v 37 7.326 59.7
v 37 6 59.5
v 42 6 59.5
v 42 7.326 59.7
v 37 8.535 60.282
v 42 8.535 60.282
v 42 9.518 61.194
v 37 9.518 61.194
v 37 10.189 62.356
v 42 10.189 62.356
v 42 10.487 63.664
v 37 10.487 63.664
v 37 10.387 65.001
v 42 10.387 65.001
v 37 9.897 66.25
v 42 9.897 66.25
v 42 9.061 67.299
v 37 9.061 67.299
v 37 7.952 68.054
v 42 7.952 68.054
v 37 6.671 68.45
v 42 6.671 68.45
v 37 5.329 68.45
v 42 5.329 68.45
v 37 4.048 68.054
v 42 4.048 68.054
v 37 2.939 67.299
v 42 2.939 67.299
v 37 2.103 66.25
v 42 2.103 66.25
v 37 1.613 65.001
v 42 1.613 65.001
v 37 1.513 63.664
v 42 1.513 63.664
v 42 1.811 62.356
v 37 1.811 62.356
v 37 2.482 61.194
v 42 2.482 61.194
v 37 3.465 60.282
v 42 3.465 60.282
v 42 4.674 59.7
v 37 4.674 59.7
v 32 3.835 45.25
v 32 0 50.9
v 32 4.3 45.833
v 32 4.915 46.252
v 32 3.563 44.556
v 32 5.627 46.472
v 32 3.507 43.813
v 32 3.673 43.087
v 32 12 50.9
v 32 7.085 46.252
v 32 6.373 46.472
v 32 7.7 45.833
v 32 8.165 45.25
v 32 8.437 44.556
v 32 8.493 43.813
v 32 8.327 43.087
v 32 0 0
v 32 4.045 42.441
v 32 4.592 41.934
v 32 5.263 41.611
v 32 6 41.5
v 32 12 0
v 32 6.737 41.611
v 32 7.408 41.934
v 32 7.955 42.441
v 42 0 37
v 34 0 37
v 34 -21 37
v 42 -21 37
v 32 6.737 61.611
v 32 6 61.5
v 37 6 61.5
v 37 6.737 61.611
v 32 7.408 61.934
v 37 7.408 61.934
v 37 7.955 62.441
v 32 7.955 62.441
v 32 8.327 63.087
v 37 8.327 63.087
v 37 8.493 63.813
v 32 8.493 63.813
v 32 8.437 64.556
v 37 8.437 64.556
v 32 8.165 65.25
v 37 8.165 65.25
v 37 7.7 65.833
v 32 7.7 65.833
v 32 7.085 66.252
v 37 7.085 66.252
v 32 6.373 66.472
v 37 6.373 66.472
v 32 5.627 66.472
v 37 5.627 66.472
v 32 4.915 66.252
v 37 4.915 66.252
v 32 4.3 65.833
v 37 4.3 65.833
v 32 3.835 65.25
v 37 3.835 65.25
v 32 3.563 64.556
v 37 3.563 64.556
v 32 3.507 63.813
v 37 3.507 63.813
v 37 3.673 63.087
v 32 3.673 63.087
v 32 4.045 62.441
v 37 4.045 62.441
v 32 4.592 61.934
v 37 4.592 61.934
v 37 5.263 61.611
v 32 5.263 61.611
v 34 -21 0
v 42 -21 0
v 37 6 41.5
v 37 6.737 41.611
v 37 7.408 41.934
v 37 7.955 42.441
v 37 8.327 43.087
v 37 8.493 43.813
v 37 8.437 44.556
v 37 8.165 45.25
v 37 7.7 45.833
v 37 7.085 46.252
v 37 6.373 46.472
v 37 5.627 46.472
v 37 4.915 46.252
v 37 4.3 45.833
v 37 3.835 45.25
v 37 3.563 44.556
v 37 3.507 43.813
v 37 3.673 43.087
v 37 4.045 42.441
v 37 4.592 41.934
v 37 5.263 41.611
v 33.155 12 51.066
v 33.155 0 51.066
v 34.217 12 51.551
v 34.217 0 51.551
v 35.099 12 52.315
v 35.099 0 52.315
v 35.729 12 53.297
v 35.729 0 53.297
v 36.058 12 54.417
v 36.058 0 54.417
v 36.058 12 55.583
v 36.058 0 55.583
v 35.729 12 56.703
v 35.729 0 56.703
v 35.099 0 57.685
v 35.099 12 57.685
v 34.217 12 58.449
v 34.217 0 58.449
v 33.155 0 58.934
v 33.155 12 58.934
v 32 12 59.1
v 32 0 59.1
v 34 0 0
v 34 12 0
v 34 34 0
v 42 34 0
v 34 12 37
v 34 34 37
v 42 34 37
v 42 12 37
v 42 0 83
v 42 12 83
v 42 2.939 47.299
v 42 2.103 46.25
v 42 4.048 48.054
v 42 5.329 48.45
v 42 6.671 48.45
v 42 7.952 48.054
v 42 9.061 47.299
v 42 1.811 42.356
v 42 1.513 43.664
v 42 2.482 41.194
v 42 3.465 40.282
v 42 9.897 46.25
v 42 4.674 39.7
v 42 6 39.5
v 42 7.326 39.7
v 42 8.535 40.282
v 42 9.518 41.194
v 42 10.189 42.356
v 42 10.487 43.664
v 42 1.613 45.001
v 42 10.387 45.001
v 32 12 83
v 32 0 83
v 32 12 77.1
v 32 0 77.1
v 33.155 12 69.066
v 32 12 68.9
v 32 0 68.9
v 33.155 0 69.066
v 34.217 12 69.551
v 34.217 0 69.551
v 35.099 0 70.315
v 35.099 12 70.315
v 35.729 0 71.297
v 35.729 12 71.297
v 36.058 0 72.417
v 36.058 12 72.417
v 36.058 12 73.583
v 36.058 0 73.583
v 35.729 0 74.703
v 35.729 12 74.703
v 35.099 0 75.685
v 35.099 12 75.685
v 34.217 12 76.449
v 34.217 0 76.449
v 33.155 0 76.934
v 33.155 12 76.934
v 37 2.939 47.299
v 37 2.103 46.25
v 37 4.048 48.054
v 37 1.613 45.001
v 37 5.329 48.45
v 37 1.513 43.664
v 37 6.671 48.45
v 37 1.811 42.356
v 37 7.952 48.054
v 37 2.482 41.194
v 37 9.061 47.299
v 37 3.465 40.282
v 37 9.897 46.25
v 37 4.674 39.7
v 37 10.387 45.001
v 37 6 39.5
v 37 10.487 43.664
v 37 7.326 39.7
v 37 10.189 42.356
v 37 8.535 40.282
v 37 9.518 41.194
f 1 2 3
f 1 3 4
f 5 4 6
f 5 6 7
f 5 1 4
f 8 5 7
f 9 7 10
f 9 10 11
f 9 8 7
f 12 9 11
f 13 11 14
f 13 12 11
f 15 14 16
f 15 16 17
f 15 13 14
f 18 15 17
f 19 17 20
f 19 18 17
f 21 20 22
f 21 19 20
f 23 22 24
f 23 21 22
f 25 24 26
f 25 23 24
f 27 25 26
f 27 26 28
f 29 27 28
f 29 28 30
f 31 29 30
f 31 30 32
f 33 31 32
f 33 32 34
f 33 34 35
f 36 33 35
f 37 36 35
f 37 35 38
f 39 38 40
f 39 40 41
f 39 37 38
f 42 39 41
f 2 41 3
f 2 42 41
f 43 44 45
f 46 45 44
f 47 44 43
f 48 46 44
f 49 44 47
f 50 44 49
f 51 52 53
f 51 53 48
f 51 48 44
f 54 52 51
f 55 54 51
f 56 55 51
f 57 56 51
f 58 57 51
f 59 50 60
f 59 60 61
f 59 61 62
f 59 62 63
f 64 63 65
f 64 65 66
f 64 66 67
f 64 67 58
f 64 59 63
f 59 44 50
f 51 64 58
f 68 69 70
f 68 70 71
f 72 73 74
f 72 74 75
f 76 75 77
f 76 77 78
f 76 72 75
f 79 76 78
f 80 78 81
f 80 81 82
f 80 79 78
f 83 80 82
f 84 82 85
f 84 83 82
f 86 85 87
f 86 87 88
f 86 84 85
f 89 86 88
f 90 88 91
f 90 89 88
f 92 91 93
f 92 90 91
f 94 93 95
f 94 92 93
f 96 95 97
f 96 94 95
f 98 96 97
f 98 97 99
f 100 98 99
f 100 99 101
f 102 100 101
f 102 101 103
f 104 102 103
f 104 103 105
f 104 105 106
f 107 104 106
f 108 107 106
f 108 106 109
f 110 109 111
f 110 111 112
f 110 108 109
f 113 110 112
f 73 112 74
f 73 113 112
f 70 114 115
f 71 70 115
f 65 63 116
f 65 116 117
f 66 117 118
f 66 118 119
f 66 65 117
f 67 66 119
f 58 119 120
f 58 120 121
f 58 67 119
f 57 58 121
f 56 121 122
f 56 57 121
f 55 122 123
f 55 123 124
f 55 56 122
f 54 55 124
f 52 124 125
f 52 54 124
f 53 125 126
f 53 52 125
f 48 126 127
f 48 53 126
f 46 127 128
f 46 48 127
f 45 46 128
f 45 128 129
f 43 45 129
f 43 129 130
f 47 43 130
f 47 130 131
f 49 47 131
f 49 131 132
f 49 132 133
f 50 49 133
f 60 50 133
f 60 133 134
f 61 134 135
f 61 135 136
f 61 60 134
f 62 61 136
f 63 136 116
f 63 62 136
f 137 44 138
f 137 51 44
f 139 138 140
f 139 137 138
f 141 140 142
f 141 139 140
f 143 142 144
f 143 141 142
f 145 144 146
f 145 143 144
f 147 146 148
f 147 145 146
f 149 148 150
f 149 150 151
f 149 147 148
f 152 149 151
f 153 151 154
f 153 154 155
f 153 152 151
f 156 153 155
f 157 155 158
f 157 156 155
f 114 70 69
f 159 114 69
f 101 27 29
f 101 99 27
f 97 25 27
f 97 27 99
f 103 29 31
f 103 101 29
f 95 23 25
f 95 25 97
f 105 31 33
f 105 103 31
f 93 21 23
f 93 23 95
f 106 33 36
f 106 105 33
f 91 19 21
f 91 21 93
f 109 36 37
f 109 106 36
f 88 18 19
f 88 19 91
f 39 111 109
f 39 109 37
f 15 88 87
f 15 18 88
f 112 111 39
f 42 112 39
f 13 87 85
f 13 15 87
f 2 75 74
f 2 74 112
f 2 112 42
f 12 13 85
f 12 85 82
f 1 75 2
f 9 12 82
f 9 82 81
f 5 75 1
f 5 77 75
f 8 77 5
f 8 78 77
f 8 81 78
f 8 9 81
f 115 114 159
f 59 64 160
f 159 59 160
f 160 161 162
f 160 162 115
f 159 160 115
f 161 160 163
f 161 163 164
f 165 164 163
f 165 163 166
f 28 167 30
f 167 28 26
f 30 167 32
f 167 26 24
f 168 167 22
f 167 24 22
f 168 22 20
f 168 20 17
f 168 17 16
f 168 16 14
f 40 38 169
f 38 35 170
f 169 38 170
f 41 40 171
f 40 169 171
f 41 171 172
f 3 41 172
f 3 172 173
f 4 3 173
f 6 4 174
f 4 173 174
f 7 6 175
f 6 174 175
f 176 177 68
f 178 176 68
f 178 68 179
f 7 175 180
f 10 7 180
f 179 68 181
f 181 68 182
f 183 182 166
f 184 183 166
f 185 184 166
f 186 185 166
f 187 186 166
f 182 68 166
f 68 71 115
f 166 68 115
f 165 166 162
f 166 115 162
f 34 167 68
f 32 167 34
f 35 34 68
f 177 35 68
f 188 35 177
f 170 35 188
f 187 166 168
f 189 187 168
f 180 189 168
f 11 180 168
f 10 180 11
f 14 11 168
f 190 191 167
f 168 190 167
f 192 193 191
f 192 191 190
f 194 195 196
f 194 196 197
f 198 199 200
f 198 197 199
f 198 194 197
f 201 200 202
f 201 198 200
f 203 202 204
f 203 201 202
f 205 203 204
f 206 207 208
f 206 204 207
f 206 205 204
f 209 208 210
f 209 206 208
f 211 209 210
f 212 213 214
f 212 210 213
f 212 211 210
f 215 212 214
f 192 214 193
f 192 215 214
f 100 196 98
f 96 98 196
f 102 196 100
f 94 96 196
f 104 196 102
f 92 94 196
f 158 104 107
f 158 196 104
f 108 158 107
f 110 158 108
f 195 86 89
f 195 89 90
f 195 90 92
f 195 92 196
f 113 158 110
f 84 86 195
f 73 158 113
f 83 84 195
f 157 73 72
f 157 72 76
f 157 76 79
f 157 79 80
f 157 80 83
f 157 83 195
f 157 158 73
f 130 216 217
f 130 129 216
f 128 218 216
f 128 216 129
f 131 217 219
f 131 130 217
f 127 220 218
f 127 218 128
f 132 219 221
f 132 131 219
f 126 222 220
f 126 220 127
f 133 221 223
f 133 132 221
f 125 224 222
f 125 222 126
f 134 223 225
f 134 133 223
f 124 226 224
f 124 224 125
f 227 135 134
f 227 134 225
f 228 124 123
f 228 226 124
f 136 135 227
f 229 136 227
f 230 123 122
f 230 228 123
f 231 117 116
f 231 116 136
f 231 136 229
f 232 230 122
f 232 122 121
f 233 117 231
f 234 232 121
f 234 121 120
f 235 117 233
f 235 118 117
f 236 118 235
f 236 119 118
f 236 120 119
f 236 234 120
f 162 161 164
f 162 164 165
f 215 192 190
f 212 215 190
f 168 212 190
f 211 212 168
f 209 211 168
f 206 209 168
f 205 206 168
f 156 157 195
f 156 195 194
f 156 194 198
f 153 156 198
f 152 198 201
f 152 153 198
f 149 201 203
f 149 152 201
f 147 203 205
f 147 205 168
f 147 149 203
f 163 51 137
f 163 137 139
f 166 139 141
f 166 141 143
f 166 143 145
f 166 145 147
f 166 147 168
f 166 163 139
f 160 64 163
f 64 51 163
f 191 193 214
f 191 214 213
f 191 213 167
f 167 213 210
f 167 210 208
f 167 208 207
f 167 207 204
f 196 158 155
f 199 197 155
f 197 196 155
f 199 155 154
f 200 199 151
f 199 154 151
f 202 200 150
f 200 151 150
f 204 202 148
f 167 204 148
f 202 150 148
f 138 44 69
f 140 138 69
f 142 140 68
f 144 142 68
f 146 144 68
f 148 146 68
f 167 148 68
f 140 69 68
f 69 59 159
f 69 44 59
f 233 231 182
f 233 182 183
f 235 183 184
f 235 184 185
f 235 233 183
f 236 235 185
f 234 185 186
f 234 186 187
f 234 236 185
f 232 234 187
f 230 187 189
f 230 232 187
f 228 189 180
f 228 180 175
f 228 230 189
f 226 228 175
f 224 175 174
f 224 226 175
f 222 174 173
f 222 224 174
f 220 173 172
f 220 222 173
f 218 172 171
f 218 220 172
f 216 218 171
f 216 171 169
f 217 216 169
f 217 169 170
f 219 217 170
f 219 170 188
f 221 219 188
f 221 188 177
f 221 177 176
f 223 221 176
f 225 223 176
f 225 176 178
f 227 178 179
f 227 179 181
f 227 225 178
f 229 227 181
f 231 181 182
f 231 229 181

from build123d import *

# Parameters (mm, degrees)
BOX008_W          = 8
BOX008_H          = 55
BOX008_DEPTH      = 37
CYLINDER022_R     = 4.1
CYLINDER022_DEPTH = 12
CYLINDER010_R     = 4.1
CYLINDER010_DEPTH = 12
CYLINDER006_R     = 4.5
CYLINDER006_DEPTH = 5
CYLINDER005_R     = 2.5
CYLINDER005_DEPTH = 5
CYLINDER012_R     = 4.5
CYLINDER012_DEPTH = 5
CYLINDER011_R     = 2.5
CYLINDER011_DEPTH = 5
BOX_W             = 10
BOX_H             = 12
BOX_DEPTH         = 83


with BuildPart() as batteriefl_che:
    # Box008 → Box008 (new body)
    with BuildSketch(Plane(origin=(34, -21, 0), x_dir=(1, 0, 0), z_dir=(0, 0, 1))):
        with Locations((4, 27.5)):
            Rectangle(BOX008_W, BOX008_H)
    extrude(amount=BOX008_DEPTH)


with BuildPart() as poleb1:
    # Cylinder022 → Cylinder022 (new body)
    with BuildSketch(Plane(origin=(32, 12, 73), x_dir=(1, 0, 0), z_dir=(0, -1, 0))):
        Circle(CYLINDER022_R)
    extrude(amount=CYLINDER022_DEPTH)


with BuildPart() as poleb2:
    # Cylinder010 → Cylinder010 (new body)
    with BuildSketch(Plane(origin=(32, 12, 55), x_dir=(1, 0, 0), z_dir=(0, -1, 0))):
        Circle(CYLINDER010_R)
    extrude(amount=CYLINDER010_DEPTH)


with BuildPart() as cylinder006:
    # Cylinder006 → Cylinder006 (new body)
    with BuildSketch(Plane(origin=(37, 5, 55), x_dir=(0, 0, -1), z_dir=(1, 0, 0))):
        Circle(CYLINDER006_R)
    extrude(amount=CYLINDER006_DEPTH)


with BuildPart() as crewhole1:
    # Cylinder005 → Cylinder005 (new body)
    with BuildSketch(Plane(origin=(32, 5, 55), x_dir=(0, 0, -1), z_dir=(1, 0, 0))):
        Circle(CYLINDER005_R)
    extrude(amount=CYLINDER005_DEPTH)

    # Fusion003: union Cylinder006
    add(cylinder006.part)


with BuildPart() as crewhole1_1:
    # Fusion003 placement: moved
    add(crewhole1.part.moved(Location((0, 1, 9))))


with BuildPart() as cylinder012:
    # Cylinder012 → Cylinder012 (new body)
    with BuildSketch(Plane(origin=(37, 5, 55), x_dir=(0, 0, -1), z_dir=(1, 0, 0))):
        Circle(CYLINDER012_R)
    extrude(amount=CYLINDER012_DEPTH)


with BuildPart() as screwholes:
    # Cylinder011 → Cylinder011 (new body)
    with BuildSketch(Plane(origin=(32, 5, 55), x_dir=(0, 0, -1), z_dir=(1, 0, 0))):
        Circle(CYLINDER011_R)
    extrude(amount=CYLINDER011_DEPTH)

    # Fusion004: union Cylinder012
    add(cylinder012.part)


with BuildPart() as screwholes_1:
    # Fusion004 placement: moved
    add(screwholes.part.moved(Location((0, 1, -11))))

    # Fusion005: union CrewHole1
    add(crewhole1_1.part)


with BuildPart() as druckb:
    # Box → Box (new body)
    with BuildSketch(Plane(origin=(32, 0, 0), x_dir=(1, 0, 0), z_dir=(0, 0, 1))):
        with Locations((5, 6)):
            Rectangle(BOX_W, BOX_H)
    extrude(amount=BOX_DEPTH)

    # Cut: cut ScrewHoles
    add(screwholes_1.part, mode=Mode.SUBTRACT)

    # Cut007: cut PoleB2
    add(poleb2.part, mode=Mode.SUBTRACT)

    # Cut008: cut PoleB1
    add(poleb1.part, mode=Mode.SUBTRACT)

    # Fusion011: union Batteriefläche
    add(batteriefl_che.part)


solid = druckb.part
